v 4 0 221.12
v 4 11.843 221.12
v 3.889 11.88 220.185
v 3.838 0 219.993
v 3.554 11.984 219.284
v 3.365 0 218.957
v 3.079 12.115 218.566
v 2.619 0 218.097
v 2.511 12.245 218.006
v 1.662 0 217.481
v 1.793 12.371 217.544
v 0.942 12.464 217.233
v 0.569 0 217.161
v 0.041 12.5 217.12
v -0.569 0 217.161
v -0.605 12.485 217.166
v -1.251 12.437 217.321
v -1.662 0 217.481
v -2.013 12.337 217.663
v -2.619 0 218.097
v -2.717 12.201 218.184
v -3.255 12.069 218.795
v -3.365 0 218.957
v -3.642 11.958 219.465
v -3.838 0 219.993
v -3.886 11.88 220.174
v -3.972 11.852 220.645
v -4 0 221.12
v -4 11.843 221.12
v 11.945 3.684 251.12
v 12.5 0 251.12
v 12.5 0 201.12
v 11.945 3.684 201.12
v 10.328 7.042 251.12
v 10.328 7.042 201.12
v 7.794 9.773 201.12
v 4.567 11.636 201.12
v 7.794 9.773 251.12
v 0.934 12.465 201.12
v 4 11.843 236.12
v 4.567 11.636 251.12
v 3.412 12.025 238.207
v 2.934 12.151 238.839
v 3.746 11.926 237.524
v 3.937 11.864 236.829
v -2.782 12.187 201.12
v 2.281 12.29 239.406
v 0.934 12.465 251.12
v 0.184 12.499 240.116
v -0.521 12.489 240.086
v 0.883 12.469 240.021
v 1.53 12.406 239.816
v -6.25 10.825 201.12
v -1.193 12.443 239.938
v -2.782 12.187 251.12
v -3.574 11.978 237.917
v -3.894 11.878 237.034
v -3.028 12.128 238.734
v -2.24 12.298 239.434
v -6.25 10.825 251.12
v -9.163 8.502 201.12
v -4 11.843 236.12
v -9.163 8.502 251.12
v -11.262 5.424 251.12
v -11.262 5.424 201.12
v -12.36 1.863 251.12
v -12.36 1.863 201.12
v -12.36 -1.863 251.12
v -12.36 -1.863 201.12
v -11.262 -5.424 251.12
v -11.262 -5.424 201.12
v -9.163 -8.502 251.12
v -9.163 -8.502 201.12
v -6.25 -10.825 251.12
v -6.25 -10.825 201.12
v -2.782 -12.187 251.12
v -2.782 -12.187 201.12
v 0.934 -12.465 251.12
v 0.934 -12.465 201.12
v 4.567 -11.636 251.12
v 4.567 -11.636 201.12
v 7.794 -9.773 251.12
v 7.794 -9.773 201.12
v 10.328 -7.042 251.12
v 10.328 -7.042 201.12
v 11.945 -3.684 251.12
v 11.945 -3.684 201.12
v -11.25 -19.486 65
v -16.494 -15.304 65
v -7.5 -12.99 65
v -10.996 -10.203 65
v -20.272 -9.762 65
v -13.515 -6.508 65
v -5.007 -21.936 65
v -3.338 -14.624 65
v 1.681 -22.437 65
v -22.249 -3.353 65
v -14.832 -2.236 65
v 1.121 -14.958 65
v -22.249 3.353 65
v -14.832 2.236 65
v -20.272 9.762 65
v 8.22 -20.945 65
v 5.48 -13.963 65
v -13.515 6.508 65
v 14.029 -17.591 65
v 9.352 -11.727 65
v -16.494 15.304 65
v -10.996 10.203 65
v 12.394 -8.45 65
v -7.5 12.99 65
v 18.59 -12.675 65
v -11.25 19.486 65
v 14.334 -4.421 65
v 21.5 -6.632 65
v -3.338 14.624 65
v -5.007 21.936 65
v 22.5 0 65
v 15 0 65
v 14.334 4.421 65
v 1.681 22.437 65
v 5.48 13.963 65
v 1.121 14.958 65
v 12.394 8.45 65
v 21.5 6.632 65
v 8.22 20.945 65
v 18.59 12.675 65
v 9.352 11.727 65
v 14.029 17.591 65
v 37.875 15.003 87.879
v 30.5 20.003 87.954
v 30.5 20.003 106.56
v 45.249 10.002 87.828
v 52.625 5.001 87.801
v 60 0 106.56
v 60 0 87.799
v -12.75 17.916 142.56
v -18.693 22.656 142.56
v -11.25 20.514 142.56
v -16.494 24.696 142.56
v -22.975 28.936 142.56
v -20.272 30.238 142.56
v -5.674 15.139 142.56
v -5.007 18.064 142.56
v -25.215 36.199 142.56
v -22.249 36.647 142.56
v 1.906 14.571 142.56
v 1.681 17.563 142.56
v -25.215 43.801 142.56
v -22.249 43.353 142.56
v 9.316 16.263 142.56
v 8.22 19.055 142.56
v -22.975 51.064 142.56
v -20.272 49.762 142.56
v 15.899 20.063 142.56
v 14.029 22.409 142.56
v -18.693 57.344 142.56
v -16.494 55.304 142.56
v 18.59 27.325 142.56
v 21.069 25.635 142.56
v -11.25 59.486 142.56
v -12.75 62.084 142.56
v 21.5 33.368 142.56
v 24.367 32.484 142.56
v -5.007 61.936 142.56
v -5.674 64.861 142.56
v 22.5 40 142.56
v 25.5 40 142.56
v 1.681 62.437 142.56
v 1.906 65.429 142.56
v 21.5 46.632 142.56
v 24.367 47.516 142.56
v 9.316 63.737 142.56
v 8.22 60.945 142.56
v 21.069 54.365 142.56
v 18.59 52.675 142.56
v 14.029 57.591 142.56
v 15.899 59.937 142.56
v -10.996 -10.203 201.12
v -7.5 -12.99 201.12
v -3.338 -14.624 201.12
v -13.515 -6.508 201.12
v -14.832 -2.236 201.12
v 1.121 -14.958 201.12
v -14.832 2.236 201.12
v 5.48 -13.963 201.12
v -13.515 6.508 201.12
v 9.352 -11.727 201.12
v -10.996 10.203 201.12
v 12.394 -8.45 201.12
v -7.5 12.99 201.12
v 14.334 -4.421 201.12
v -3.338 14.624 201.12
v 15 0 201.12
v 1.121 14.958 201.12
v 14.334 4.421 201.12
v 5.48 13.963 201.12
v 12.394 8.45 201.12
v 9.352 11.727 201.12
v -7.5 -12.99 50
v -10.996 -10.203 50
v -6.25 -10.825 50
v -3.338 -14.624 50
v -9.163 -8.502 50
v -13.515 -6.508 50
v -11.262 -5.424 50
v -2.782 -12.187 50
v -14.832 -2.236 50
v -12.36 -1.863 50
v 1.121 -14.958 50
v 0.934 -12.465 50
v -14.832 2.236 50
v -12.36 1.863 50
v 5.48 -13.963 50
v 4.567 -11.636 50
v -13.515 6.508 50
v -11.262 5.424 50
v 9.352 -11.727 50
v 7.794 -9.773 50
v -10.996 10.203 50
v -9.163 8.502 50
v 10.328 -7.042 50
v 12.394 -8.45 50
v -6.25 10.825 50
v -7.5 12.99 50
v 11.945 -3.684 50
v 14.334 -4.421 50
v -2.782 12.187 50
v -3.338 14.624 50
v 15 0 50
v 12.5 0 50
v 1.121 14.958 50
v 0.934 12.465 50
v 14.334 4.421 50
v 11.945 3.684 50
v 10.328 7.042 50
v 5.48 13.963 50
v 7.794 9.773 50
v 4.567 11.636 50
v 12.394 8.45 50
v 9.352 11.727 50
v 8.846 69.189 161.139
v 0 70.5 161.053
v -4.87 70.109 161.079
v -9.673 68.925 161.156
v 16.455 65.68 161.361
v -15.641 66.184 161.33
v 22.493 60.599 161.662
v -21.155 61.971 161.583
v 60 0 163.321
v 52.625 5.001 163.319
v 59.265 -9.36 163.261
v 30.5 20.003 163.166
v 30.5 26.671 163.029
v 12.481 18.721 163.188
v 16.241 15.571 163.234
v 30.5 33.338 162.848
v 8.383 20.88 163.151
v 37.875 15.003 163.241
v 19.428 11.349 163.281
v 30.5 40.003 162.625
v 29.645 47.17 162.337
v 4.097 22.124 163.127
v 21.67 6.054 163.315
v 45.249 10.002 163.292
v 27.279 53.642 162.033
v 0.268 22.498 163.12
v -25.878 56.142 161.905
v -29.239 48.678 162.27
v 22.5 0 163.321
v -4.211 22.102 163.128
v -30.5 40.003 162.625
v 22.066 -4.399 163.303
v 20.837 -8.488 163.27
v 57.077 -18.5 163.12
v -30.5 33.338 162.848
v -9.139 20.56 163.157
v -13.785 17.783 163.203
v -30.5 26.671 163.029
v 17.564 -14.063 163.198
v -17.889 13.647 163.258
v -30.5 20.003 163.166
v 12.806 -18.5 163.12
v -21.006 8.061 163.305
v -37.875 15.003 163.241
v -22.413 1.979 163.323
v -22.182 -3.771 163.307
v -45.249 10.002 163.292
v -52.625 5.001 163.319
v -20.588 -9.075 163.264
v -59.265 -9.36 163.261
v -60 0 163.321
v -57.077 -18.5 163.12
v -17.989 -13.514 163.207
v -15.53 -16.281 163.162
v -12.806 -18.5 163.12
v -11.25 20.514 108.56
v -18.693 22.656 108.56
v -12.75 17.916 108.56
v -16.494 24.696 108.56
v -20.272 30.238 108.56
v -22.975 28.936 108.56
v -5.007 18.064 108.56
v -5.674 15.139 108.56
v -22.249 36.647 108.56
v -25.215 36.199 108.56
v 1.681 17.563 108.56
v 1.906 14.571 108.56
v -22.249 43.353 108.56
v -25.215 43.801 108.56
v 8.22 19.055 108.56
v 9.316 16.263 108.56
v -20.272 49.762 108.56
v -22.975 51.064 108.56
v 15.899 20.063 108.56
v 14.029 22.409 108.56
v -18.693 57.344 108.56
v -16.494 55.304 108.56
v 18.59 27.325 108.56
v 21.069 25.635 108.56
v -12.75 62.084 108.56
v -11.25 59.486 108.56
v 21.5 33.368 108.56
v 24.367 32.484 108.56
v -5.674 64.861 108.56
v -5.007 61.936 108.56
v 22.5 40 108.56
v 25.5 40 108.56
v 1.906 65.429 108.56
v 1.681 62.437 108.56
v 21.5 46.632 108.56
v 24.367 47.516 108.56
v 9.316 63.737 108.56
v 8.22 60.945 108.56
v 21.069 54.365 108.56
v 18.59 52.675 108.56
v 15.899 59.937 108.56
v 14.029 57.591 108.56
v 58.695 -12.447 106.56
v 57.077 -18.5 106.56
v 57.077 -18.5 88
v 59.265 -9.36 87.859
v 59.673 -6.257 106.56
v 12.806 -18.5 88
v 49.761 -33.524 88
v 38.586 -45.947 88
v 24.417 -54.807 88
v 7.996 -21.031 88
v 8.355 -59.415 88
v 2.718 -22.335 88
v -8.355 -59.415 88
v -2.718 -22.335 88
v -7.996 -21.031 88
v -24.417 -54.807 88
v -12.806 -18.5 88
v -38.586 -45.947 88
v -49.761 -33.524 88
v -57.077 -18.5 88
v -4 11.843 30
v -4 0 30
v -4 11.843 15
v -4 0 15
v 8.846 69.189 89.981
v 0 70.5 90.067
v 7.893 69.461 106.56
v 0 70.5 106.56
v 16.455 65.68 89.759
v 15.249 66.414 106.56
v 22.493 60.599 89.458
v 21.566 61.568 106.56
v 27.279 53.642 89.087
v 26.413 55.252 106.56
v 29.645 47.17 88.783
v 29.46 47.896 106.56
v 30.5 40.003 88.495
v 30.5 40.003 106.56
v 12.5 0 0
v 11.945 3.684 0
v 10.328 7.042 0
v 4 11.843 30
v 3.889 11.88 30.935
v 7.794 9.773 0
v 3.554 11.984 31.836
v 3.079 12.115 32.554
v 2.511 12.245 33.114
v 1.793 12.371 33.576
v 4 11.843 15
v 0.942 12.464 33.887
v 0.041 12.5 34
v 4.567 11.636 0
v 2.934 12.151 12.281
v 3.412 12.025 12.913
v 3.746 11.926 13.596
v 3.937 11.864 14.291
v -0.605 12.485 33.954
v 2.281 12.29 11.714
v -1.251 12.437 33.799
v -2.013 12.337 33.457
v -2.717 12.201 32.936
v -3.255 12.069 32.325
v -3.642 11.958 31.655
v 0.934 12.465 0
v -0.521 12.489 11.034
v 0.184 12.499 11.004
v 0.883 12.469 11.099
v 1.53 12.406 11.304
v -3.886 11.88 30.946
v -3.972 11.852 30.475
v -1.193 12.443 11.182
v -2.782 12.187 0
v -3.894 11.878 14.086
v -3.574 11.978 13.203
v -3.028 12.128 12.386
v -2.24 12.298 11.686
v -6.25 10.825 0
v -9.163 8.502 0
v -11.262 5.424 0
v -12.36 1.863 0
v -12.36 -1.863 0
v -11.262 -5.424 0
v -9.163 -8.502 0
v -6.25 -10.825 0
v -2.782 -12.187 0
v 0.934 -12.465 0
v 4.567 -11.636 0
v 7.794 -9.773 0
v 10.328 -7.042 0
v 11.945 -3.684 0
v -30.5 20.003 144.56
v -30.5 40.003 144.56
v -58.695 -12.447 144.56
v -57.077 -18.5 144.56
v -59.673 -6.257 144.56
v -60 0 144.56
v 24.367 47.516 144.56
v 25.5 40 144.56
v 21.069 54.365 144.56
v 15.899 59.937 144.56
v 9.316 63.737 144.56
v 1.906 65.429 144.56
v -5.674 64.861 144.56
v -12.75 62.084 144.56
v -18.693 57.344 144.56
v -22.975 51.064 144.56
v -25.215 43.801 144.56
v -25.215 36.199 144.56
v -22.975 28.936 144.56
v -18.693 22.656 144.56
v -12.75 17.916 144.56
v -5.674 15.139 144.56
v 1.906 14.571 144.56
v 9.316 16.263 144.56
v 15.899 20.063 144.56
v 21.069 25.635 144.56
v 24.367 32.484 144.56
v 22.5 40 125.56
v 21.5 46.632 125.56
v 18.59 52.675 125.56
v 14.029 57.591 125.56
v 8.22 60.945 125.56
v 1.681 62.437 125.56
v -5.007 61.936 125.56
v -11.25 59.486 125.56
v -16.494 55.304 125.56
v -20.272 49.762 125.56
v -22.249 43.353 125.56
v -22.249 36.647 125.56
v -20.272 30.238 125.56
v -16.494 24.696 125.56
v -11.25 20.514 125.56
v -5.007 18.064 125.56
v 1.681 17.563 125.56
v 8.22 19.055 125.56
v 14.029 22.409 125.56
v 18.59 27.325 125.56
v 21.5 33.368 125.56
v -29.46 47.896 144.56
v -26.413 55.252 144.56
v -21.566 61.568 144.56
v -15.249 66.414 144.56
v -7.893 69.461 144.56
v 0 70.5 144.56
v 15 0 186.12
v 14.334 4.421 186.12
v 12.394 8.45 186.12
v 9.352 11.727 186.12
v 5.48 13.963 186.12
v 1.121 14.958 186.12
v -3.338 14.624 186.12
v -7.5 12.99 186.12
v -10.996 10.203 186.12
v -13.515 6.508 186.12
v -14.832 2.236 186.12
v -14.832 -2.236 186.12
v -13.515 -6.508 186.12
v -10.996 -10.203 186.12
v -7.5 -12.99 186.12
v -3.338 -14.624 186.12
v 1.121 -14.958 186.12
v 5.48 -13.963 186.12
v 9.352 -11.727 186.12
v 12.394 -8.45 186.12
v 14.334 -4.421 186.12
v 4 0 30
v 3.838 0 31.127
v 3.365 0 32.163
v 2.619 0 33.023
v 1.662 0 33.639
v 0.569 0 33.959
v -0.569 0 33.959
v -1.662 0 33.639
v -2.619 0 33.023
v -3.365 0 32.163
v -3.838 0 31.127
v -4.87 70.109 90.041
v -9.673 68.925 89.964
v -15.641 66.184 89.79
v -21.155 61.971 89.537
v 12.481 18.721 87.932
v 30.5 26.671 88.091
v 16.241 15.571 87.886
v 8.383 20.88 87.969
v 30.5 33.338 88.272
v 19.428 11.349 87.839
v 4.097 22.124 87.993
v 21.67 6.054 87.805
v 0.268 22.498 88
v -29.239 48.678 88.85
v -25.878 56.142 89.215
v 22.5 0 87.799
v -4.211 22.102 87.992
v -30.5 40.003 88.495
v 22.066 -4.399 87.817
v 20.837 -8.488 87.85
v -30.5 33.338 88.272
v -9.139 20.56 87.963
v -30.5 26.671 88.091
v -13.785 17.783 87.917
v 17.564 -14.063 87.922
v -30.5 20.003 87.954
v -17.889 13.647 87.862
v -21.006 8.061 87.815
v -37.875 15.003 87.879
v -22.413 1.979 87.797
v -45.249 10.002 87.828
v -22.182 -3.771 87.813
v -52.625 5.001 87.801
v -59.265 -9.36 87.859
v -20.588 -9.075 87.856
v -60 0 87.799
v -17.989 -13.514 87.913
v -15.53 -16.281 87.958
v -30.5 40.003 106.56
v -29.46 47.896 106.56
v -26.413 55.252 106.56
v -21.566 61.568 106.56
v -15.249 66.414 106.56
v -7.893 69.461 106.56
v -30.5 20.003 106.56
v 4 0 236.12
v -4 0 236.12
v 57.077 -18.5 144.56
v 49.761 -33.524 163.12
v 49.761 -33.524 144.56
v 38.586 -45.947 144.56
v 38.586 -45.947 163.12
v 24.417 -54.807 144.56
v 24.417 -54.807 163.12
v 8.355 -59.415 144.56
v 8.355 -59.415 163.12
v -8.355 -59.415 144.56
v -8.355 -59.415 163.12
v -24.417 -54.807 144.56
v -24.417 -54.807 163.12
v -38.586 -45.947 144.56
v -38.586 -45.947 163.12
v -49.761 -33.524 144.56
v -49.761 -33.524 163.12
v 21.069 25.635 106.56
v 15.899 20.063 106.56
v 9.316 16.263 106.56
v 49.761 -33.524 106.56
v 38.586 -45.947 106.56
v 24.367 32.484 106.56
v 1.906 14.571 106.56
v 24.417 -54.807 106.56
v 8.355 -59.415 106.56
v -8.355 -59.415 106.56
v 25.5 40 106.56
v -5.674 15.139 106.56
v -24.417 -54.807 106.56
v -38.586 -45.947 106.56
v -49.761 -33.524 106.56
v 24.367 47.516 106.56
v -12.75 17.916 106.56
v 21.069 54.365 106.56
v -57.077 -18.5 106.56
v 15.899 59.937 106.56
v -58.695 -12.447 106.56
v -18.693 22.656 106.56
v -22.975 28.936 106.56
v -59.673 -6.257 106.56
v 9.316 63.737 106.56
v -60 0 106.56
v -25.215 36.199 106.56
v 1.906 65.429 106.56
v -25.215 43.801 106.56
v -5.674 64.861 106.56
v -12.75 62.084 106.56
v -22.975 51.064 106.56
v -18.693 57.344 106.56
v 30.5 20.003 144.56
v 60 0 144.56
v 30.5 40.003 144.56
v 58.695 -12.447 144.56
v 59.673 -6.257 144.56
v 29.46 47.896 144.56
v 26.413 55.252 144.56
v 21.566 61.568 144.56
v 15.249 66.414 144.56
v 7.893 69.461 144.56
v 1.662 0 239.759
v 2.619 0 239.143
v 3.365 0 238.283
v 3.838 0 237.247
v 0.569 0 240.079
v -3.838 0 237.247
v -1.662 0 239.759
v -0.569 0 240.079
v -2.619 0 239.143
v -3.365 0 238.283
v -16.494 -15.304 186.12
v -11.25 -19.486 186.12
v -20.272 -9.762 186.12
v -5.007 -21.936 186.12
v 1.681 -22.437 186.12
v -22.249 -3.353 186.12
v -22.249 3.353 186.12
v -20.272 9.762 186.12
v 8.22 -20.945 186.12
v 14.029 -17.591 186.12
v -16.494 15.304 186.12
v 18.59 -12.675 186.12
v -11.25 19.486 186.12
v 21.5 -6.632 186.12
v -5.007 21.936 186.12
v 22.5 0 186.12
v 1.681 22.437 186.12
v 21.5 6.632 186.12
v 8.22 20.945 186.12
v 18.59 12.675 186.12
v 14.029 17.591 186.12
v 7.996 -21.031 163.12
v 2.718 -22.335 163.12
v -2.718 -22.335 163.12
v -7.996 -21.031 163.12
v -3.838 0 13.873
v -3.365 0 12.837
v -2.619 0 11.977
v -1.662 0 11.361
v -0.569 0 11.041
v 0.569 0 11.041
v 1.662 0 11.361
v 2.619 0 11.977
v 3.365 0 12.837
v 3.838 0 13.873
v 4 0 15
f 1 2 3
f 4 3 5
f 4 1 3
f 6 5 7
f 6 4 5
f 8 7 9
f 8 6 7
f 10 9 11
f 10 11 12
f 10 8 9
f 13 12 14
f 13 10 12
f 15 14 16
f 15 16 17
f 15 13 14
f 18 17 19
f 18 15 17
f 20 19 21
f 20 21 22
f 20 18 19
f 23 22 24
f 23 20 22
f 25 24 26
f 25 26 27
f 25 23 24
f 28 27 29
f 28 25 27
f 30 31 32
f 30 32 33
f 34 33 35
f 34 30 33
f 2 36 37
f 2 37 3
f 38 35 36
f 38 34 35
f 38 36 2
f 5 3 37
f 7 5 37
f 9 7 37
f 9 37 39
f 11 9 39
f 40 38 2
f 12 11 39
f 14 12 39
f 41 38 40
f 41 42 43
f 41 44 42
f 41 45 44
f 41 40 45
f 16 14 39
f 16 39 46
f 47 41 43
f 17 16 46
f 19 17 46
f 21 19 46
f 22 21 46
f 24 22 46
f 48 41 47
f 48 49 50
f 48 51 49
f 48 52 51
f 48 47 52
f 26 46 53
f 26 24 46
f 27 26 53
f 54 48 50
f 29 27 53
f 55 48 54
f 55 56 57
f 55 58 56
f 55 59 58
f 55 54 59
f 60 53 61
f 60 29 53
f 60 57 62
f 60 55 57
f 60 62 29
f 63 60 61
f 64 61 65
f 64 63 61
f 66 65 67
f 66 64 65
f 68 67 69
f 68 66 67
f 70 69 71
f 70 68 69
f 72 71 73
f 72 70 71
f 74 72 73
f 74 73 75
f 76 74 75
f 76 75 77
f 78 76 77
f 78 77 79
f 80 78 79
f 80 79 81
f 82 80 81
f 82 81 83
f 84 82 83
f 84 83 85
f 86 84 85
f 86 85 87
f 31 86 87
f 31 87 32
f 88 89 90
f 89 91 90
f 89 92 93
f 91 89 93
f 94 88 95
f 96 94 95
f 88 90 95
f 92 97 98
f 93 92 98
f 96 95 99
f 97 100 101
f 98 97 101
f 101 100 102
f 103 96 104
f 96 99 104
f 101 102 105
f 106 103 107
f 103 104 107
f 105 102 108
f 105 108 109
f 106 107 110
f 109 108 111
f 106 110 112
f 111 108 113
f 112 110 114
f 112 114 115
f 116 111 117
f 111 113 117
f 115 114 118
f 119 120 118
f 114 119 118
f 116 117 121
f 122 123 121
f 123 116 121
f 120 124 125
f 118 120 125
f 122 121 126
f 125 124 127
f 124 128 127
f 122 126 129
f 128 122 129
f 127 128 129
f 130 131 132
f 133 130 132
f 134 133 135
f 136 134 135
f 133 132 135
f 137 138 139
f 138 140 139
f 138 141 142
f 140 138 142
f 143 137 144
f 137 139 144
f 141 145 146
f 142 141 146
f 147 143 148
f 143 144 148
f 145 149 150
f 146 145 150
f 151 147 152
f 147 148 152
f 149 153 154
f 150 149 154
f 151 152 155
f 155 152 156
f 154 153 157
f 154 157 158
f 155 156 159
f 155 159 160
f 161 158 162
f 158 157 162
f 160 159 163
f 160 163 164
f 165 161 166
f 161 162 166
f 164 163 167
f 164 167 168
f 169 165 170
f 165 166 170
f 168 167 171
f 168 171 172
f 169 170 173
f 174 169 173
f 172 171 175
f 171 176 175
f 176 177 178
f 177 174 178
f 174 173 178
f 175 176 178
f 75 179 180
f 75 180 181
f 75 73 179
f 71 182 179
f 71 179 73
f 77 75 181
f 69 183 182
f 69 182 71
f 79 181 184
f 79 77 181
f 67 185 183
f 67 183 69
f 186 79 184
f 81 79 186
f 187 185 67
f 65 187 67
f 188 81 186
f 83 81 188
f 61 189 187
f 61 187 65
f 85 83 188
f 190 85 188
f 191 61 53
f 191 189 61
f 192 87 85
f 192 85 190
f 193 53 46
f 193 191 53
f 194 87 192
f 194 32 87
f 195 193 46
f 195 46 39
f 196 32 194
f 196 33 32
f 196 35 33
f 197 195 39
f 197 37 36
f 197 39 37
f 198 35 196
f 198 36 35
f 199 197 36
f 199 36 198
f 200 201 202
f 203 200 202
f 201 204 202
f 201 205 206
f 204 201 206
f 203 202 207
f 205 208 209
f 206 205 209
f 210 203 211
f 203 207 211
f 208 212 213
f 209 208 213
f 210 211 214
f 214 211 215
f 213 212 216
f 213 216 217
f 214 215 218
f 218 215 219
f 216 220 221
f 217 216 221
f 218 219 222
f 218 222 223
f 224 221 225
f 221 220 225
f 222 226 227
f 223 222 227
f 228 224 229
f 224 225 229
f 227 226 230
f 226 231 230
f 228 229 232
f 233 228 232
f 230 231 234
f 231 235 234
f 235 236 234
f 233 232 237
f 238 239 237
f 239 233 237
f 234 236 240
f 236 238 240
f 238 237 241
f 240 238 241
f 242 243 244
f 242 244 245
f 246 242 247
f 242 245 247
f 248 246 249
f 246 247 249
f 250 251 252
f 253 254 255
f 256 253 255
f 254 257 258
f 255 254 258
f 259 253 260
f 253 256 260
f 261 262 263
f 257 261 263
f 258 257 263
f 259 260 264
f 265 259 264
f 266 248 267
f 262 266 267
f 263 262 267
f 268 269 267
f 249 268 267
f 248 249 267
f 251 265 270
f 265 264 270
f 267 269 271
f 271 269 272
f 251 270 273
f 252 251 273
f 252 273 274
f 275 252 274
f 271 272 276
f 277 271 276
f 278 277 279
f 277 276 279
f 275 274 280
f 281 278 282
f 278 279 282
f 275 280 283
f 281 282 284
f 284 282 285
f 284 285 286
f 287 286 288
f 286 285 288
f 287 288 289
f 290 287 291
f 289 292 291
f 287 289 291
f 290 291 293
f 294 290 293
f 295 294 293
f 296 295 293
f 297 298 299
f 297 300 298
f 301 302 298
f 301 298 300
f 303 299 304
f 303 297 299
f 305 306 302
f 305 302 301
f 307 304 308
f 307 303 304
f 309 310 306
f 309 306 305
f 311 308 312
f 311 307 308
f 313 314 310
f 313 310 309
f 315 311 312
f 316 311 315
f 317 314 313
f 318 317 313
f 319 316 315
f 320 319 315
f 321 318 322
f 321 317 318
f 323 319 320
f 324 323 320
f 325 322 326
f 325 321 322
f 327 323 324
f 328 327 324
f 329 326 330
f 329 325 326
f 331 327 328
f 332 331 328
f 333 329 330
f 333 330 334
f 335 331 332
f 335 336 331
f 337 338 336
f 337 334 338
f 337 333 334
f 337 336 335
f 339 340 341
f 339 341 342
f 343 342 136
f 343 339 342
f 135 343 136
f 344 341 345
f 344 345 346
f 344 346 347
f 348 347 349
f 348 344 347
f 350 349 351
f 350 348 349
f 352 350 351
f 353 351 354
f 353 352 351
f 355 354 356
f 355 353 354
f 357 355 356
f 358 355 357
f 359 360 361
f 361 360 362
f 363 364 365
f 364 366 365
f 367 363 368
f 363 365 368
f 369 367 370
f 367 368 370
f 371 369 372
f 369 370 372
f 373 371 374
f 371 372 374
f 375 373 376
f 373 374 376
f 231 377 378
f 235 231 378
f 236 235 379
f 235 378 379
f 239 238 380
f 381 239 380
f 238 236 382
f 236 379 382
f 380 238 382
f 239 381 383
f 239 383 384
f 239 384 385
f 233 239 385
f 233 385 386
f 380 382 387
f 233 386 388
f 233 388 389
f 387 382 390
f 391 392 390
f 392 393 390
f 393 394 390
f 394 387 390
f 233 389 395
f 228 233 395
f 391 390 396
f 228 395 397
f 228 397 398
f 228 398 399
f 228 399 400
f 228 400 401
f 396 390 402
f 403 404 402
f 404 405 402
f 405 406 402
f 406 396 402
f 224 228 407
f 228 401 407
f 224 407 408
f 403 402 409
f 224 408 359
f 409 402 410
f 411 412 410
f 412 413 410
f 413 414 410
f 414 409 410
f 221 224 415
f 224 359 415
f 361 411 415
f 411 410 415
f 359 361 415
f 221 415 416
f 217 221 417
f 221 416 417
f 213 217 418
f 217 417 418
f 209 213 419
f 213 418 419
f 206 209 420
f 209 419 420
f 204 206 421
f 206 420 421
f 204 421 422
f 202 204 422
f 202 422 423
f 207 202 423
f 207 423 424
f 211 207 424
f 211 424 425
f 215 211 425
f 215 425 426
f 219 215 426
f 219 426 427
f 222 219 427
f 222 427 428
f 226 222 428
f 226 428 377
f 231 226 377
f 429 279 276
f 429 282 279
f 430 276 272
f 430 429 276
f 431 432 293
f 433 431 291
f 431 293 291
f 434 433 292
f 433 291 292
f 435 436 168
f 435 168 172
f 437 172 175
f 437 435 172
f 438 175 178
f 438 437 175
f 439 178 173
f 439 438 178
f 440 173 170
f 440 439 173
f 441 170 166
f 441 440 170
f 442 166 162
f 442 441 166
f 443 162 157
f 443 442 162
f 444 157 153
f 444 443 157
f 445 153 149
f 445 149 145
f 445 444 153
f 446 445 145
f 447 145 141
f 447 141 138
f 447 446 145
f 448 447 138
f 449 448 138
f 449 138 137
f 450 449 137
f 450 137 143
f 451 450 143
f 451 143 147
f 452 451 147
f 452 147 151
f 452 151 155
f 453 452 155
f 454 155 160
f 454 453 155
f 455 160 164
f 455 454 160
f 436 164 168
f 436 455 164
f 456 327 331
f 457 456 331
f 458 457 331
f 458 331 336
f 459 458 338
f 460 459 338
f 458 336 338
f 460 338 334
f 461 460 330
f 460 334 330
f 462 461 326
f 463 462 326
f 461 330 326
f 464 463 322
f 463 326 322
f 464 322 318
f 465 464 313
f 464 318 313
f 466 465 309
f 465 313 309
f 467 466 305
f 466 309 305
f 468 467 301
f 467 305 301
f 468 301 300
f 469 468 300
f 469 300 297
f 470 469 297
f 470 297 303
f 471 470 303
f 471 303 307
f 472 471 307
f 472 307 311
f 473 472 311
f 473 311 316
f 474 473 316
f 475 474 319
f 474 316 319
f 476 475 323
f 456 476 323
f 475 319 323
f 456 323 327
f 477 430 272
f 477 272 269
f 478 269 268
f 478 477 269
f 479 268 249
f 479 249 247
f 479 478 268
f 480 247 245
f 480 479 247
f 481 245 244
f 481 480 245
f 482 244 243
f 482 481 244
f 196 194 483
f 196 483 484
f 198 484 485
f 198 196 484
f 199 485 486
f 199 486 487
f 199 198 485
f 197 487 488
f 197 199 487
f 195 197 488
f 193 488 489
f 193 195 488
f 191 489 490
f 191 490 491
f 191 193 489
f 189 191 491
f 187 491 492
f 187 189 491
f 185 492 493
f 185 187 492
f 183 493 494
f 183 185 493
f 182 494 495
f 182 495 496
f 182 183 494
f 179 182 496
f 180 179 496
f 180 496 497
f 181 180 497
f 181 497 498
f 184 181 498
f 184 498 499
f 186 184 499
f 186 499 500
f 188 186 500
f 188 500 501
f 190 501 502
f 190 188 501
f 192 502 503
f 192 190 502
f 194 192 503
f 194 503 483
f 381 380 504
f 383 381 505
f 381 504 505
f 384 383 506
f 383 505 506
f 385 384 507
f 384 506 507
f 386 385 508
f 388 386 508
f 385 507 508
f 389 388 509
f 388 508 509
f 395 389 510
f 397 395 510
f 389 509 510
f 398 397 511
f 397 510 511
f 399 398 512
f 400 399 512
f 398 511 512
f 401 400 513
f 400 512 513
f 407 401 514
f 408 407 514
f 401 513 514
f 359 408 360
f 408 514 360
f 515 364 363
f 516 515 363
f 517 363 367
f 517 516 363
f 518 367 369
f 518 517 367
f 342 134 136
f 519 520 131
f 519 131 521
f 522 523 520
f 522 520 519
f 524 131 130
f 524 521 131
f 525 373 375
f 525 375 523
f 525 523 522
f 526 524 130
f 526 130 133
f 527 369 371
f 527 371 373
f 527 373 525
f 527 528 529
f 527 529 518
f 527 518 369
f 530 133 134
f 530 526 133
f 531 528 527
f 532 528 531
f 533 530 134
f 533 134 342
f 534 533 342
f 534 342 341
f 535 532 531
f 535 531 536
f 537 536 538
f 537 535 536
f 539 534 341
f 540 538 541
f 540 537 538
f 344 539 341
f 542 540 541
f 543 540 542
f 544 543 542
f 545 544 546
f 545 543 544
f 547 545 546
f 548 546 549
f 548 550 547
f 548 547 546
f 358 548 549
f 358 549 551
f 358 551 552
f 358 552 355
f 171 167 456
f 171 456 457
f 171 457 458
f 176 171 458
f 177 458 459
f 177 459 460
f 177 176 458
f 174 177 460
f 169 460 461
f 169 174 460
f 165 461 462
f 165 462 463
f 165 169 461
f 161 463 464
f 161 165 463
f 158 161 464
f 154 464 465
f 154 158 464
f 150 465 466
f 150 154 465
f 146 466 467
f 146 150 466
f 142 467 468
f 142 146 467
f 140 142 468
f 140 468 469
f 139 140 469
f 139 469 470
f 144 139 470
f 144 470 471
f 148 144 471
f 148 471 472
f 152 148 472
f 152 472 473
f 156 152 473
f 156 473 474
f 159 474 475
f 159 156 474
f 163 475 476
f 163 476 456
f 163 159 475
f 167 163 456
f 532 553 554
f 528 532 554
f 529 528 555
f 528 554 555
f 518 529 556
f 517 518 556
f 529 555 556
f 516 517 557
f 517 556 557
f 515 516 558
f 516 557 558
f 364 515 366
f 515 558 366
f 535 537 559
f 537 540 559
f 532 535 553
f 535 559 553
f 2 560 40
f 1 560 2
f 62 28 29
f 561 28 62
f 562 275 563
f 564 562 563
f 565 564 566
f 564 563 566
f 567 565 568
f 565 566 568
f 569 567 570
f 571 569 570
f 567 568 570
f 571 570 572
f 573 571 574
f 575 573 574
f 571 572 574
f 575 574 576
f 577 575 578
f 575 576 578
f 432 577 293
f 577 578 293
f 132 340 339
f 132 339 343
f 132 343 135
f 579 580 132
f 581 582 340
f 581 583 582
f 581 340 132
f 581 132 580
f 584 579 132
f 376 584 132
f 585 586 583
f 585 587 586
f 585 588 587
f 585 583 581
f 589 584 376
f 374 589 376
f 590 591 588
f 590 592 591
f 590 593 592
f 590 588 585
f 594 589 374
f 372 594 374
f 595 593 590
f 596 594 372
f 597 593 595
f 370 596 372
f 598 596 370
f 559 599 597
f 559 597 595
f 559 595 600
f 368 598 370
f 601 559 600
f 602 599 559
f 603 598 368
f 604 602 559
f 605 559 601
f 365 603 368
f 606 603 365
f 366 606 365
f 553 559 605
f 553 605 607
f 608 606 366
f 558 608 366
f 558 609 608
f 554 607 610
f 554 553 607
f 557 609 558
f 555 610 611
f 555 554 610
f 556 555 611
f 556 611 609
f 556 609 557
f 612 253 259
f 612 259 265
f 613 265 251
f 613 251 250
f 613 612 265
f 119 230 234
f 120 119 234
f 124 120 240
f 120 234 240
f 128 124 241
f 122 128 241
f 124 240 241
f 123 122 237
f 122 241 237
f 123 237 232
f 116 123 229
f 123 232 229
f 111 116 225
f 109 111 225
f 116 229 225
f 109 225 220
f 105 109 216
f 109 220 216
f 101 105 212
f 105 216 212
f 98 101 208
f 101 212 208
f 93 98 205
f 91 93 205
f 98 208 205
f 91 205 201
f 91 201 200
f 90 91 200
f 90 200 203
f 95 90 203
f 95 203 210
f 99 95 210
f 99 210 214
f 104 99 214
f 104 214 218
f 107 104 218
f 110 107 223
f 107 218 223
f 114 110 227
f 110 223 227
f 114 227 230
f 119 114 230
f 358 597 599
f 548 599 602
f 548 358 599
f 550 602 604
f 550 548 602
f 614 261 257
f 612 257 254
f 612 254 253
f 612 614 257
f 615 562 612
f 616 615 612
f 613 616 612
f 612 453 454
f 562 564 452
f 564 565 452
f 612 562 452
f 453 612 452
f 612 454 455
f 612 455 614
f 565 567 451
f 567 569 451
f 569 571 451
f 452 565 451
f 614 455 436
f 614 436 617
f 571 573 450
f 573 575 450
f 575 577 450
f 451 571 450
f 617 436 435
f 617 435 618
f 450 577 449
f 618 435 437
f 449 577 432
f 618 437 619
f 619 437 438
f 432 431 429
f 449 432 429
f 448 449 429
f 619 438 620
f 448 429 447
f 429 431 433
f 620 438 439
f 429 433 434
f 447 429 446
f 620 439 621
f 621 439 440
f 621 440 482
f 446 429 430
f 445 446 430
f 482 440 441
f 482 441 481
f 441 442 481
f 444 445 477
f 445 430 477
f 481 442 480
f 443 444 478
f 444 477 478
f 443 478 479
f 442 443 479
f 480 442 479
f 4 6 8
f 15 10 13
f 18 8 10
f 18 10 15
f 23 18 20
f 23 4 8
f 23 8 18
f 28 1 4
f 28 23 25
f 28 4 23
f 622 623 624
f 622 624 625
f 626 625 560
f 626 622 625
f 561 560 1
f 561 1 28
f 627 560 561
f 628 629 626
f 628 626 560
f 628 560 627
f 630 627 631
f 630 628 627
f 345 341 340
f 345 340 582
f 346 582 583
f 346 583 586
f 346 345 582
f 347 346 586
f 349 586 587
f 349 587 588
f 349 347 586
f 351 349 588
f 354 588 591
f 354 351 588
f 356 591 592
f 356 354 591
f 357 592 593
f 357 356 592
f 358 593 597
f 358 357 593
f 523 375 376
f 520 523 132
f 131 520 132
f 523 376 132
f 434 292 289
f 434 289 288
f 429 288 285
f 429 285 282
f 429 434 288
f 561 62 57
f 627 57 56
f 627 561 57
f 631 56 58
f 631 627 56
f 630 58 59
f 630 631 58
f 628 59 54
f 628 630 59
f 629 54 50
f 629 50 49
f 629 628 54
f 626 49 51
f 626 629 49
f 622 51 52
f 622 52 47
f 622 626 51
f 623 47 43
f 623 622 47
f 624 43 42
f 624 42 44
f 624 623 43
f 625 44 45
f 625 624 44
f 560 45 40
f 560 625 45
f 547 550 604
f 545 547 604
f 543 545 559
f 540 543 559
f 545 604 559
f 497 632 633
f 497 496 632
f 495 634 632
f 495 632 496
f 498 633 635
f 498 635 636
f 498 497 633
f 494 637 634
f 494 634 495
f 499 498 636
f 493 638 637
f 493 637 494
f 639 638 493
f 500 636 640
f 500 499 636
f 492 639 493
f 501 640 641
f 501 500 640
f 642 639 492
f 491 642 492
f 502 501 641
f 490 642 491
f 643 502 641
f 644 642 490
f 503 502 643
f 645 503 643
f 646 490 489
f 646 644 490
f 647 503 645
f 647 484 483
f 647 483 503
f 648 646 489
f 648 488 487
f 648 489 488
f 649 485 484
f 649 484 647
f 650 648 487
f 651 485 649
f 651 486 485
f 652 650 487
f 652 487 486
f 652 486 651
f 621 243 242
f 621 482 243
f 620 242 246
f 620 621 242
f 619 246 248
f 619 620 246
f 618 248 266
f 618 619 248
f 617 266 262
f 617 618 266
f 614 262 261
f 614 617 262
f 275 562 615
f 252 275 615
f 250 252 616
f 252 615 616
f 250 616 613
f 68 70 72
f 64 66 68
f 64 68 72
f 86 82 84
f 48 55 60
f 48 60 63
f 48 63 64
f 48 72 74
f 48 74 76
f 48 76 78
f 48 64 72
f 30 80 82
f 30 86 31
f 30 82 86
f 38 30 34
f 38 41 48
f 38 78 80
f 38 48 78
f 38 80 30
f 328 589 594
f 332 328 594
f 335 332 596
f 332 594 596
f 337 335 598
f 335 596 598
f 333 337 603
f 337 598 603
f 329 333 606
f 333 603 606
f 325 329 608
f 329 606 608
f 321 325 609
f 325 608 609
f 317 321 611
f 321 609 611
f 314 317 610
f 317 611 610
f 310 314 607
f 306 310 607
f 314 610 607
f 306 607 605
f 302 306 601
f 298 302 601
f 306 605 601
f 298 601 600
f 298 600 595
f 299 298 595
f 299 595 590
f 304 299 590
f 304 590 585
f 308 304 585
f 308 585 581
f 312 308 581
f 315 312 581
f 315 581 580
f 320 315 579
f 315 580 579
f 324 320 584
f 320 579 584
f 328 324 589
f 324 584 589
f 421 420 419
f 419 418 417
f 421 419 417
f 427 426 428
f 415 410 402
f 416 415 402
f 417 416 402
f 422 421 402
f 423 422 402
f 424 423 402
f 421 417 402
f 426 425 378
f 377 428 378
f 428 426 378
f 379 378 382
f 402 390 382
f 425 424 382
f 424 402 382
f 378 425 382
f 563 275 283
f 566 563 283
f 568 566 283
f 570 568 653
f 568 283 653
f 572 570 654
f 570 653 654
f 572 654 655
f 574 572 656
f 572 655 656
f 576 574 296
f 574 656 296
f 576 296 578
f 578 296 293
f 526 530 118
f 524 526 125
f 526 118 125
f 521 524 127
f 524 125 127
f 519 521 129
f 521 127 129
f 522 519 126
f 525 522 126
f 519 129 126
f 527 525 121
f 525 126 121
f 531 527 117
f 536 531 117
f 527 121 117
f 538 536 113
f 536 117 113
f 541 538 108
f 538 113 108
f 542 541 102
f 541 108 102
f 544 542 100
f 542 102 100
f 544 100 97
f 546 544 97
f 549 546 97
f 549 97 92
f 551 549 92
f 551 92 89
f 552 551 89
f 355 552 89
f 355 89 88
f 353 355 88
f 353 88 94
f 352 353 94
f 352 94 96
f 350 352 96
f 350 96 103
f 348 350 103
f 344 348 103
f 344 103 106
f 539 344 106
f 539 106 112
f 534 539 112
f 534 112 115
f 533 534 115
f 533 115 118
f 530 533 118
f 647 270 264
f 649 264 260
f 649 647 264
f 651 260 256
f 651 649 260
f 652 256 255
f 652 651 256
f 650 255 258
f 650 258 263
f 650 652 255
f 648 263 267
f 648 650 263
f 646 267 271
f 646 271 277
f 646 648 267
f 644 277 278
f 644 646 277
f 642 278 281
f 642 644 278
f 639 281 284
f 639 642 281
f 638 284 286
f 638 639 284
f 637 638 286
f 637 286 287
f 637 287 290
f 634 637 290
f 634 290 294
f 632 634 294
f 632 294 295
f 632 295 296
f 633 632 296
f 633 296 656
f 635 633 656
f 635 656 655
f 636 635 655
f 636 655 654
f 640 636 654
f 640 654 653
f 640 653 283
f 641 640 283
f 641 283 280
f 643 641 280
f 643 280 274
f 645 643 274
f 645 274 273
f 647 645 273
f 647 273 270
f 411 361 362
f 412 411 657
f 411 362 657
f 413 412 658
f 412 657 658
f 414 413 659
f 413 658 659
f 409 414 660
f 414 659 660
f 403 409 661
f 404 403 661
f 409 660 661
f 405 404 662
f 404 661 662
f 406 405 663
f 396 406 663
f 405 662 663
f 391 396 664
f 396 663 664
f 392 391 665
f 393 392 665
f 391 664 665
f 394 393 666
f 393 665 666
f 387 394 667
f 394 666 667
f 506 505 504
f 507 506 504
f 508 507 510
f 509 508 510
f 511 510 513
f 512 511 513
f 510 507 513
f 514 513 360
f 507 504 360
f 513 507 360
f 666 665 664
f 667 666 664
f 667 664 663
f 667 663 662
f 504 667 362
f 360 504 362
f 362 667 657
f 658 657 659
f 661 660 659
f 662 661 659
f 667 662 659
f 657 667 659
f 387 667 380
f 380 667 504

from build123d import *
from build123d.topology import SkipClean

# Parameters (mm, degrees)
SKETCH1_R                = 12.5
BOSS_EXTRUDE1_DEPTH      = 50
SKETCH2_R                = 15
BOSS_EXTRUDE2_DEPTH      = 15
SKETCH3_R                = 22.5
BOSS_EXTRUDE3_DEPTH      = 23
BOSS_EXTRUDE4_DEPTH      = 18.56
BOSS_EXTRUDE5_DEPTH      = 60
BOSS_EXTRUDE5_DEPTH_BACK = 60
CUT_EXTRUDE1_DEPTH       = 29.78
CUT_EXTRUDE2_DEPTH       = 59.56
SKETCH9_R                = 25.5
BOSS_EXTRUDE7_DEPTH      = 2
SKETCH10_R               = 22.5
BOSS_EXTRUDE8_DEPTH      = 17
CUT_EXTRUDE3_DEPTH       = 17


with BuildPart() as part:
    # Sketch1 → Boss-Extrude1 (new body)
    with BuildSketch(Plane.XY):
        Circle(SKETCH1_R)
    extrude(amount=BOSS_EXTRUDE1_DEPTH)

    # Sketch2 → Boss-Extrude2 (add)
    with BuildSketch(Plane.XY.offset(50)):
        Circle(SKETCH2_R)
    extrude(amount=BOSS_EXTRUDE2_DEPTH)

    # Sketch3 → Boss-Extrude3 (add)
    with BuildSketch(Plane.XY.offset(65)):
        Circle(SKETCH3_R)
    extrude(amount=BOSS_EXTRUDE3_DEPTH)

    # Sketch4 → Boss-Extrude4 (add)
    with BuildSketch(Plane.XY.offset(88)):
        with BuildLine():
            Line((-57.076702778, -18.5), (57.076702778, -18.5))
            ThreePointArc((57.076702778, -18.5), (0, -60), (-57.076702778, -18.5))
        make_face()
    extrude(amount=BOSS_EXTRUDE4_DEPTH)

    # Sketch5 → Boss-Extrude5 (add, two sides: drawn at the far end of the back side and taken through both)
    with BuildSketch(Plane(origin=(0, 0, 0), x_dir=(0, 0, -1), z_dir=(1, 0, 0)).offset(-BOSS_EXTRUDE5_DEPTH_BACK)):
        with BuildLine():
            Line((-106.56, -18.5), (-106.56, 70.5))
            Line((-106.56, 70.5), (-90.067236991, 70.5))
            ThreePointArc((-90.067236991, 70.5), (-88.075811945, 26.022247339), (-88, -18.5))
            Line((-88, -18.5), (-106.56, -18.5))
        make_face()
    extrude(amount=BOSS_EXTRUDE5_DEPTH + BOSS_EXTRUDE5_DEPTH_BACK)

    # Sketch7 → Cut-Extrude1 (cut, symmetric)
    with SkipClean():  # the faces are left unmerged after this step: merging them gives an invalid solid
        with BuildSketch(Plane(origin=(0, 0, 88), x_dir=(-1, 0, 0), z_dir=(0, 0, -1))):
            with BuildLine():
                Line((-60, 0), (-60, -18.5))
                Line((-60, -18.5), (-57.076702778, -18.5))
                ThreePointArc((-57.076702778, -18.5), (-59.264669773, -9.364769974), (-60, 0))
            make_face()
            with BuildLine():
                Line((60, 0), (60, -18.5))
                Line((60, -18.5), (57.076702778, -18.5))
                ThreePointArc((57.076702778, -18.5), (59.264669773, -9.364769974), (60, 0))
            make_face()
        extrude(amount=CUT_EXTRUDE1_DEPTH, both=True, mode=Mode.SUBTRACT)

    # Sketch8 → Cut-Extrude2 (cut)
    with SkipClean():  # the faces are left unmerged after this step: merging them gives an invalid solid
        with BuildSketch(Plane.XY.offset(106.56)):
            with BuildLine():
                Line((60, 70.5), (2.15e-07, 70.5))
                ThreePointArc((2.15e-07, 70.5), (21.565678046, 61.567835553), (30.499999847, 40.003051391))
                Line((30.499999847, 40.003051391), (30.499999847, 20.003051391))
                Line((30.499999847, 20.003051391), (60, 0))
                Line((60, 0), (60, 70.5))
            make_face()
            with BuildLine():
                Line((-60, 70.5), (-60, 0))
                Line((-60, 0), (-30.499999847, 20.003051391))
                Line((-30.499999847, 20.003051391), (-30.499999847, 40.003051391))
                ThreePointArc((-30.499999847, 40.003051391), (-21.565677894, 61.567835705), (2.15e-07, 70.5))
                Line((2.15e-07, 70.5), (-60, 70.5))
            make_face()
        extrude(amount=-CUT_EXTRUDE2_DEPTH, mode=Mode.SUBTRACT)

    # Sketch9 → Boss-Extrude7 (add)
    with SkipClean():  # the faces are left unmerged after this step: merging them gives an invalid solid
        with BuildSketch(Plane.XY.offset(106.56)):
            with Locations((0, 40)):
                Circle(SKETCH9_R)
        extrude(amount=BOSS_EXTRUDE7_DEPTH)

    # Sketch10 → Boss-Extrude8 (add)
    with SkipClean():  # the faces are left unmerged after this step: merging them gives an invalid solid
        with BuildSketch(Plane.XY.offset(108.56)):
            with Locations((0, 40)):
                Circle(SKETCH10_R)
        extrude(amount=BOSS_EXTRUDE8_DEPTH)

    # Sketch11 → Cut-Extrude3 (cut)
    with SkipClean():  # the faces are left unmerged after this step: merging them gives an invalid solid
        with BuildSketch(Plane(origin=(0, 0, 0), x_dir=(1, 0, 0), z_dir=(0, 1, 0))):
            with BuildLine():
                Line((4, -15), (4, -30))
                ThreePointArc((4, -30), (0, -34), (-4, -30))
                Line((-4, -30), (-4, -15))
                ThreePointArc((-4, -15), (0, -11), (4, -15))
            make_face()
        extrude(amount=CUT_EXTRUDE3_DEPTH, mode=Mode.SUBTRACT)

    # Mirror1: part across plane


with BuildPart() as part_1:
    with SkipClean():  # the faces are left unmerged after this step: merging them gives an invalid solid
        add(part.part)
        add(part.part.mirror(Plane(origin=(0, 40, 125.56), x_dir=(1, 0, 0), z_dir=(0, 0, 1))))


solid = part_1.part
